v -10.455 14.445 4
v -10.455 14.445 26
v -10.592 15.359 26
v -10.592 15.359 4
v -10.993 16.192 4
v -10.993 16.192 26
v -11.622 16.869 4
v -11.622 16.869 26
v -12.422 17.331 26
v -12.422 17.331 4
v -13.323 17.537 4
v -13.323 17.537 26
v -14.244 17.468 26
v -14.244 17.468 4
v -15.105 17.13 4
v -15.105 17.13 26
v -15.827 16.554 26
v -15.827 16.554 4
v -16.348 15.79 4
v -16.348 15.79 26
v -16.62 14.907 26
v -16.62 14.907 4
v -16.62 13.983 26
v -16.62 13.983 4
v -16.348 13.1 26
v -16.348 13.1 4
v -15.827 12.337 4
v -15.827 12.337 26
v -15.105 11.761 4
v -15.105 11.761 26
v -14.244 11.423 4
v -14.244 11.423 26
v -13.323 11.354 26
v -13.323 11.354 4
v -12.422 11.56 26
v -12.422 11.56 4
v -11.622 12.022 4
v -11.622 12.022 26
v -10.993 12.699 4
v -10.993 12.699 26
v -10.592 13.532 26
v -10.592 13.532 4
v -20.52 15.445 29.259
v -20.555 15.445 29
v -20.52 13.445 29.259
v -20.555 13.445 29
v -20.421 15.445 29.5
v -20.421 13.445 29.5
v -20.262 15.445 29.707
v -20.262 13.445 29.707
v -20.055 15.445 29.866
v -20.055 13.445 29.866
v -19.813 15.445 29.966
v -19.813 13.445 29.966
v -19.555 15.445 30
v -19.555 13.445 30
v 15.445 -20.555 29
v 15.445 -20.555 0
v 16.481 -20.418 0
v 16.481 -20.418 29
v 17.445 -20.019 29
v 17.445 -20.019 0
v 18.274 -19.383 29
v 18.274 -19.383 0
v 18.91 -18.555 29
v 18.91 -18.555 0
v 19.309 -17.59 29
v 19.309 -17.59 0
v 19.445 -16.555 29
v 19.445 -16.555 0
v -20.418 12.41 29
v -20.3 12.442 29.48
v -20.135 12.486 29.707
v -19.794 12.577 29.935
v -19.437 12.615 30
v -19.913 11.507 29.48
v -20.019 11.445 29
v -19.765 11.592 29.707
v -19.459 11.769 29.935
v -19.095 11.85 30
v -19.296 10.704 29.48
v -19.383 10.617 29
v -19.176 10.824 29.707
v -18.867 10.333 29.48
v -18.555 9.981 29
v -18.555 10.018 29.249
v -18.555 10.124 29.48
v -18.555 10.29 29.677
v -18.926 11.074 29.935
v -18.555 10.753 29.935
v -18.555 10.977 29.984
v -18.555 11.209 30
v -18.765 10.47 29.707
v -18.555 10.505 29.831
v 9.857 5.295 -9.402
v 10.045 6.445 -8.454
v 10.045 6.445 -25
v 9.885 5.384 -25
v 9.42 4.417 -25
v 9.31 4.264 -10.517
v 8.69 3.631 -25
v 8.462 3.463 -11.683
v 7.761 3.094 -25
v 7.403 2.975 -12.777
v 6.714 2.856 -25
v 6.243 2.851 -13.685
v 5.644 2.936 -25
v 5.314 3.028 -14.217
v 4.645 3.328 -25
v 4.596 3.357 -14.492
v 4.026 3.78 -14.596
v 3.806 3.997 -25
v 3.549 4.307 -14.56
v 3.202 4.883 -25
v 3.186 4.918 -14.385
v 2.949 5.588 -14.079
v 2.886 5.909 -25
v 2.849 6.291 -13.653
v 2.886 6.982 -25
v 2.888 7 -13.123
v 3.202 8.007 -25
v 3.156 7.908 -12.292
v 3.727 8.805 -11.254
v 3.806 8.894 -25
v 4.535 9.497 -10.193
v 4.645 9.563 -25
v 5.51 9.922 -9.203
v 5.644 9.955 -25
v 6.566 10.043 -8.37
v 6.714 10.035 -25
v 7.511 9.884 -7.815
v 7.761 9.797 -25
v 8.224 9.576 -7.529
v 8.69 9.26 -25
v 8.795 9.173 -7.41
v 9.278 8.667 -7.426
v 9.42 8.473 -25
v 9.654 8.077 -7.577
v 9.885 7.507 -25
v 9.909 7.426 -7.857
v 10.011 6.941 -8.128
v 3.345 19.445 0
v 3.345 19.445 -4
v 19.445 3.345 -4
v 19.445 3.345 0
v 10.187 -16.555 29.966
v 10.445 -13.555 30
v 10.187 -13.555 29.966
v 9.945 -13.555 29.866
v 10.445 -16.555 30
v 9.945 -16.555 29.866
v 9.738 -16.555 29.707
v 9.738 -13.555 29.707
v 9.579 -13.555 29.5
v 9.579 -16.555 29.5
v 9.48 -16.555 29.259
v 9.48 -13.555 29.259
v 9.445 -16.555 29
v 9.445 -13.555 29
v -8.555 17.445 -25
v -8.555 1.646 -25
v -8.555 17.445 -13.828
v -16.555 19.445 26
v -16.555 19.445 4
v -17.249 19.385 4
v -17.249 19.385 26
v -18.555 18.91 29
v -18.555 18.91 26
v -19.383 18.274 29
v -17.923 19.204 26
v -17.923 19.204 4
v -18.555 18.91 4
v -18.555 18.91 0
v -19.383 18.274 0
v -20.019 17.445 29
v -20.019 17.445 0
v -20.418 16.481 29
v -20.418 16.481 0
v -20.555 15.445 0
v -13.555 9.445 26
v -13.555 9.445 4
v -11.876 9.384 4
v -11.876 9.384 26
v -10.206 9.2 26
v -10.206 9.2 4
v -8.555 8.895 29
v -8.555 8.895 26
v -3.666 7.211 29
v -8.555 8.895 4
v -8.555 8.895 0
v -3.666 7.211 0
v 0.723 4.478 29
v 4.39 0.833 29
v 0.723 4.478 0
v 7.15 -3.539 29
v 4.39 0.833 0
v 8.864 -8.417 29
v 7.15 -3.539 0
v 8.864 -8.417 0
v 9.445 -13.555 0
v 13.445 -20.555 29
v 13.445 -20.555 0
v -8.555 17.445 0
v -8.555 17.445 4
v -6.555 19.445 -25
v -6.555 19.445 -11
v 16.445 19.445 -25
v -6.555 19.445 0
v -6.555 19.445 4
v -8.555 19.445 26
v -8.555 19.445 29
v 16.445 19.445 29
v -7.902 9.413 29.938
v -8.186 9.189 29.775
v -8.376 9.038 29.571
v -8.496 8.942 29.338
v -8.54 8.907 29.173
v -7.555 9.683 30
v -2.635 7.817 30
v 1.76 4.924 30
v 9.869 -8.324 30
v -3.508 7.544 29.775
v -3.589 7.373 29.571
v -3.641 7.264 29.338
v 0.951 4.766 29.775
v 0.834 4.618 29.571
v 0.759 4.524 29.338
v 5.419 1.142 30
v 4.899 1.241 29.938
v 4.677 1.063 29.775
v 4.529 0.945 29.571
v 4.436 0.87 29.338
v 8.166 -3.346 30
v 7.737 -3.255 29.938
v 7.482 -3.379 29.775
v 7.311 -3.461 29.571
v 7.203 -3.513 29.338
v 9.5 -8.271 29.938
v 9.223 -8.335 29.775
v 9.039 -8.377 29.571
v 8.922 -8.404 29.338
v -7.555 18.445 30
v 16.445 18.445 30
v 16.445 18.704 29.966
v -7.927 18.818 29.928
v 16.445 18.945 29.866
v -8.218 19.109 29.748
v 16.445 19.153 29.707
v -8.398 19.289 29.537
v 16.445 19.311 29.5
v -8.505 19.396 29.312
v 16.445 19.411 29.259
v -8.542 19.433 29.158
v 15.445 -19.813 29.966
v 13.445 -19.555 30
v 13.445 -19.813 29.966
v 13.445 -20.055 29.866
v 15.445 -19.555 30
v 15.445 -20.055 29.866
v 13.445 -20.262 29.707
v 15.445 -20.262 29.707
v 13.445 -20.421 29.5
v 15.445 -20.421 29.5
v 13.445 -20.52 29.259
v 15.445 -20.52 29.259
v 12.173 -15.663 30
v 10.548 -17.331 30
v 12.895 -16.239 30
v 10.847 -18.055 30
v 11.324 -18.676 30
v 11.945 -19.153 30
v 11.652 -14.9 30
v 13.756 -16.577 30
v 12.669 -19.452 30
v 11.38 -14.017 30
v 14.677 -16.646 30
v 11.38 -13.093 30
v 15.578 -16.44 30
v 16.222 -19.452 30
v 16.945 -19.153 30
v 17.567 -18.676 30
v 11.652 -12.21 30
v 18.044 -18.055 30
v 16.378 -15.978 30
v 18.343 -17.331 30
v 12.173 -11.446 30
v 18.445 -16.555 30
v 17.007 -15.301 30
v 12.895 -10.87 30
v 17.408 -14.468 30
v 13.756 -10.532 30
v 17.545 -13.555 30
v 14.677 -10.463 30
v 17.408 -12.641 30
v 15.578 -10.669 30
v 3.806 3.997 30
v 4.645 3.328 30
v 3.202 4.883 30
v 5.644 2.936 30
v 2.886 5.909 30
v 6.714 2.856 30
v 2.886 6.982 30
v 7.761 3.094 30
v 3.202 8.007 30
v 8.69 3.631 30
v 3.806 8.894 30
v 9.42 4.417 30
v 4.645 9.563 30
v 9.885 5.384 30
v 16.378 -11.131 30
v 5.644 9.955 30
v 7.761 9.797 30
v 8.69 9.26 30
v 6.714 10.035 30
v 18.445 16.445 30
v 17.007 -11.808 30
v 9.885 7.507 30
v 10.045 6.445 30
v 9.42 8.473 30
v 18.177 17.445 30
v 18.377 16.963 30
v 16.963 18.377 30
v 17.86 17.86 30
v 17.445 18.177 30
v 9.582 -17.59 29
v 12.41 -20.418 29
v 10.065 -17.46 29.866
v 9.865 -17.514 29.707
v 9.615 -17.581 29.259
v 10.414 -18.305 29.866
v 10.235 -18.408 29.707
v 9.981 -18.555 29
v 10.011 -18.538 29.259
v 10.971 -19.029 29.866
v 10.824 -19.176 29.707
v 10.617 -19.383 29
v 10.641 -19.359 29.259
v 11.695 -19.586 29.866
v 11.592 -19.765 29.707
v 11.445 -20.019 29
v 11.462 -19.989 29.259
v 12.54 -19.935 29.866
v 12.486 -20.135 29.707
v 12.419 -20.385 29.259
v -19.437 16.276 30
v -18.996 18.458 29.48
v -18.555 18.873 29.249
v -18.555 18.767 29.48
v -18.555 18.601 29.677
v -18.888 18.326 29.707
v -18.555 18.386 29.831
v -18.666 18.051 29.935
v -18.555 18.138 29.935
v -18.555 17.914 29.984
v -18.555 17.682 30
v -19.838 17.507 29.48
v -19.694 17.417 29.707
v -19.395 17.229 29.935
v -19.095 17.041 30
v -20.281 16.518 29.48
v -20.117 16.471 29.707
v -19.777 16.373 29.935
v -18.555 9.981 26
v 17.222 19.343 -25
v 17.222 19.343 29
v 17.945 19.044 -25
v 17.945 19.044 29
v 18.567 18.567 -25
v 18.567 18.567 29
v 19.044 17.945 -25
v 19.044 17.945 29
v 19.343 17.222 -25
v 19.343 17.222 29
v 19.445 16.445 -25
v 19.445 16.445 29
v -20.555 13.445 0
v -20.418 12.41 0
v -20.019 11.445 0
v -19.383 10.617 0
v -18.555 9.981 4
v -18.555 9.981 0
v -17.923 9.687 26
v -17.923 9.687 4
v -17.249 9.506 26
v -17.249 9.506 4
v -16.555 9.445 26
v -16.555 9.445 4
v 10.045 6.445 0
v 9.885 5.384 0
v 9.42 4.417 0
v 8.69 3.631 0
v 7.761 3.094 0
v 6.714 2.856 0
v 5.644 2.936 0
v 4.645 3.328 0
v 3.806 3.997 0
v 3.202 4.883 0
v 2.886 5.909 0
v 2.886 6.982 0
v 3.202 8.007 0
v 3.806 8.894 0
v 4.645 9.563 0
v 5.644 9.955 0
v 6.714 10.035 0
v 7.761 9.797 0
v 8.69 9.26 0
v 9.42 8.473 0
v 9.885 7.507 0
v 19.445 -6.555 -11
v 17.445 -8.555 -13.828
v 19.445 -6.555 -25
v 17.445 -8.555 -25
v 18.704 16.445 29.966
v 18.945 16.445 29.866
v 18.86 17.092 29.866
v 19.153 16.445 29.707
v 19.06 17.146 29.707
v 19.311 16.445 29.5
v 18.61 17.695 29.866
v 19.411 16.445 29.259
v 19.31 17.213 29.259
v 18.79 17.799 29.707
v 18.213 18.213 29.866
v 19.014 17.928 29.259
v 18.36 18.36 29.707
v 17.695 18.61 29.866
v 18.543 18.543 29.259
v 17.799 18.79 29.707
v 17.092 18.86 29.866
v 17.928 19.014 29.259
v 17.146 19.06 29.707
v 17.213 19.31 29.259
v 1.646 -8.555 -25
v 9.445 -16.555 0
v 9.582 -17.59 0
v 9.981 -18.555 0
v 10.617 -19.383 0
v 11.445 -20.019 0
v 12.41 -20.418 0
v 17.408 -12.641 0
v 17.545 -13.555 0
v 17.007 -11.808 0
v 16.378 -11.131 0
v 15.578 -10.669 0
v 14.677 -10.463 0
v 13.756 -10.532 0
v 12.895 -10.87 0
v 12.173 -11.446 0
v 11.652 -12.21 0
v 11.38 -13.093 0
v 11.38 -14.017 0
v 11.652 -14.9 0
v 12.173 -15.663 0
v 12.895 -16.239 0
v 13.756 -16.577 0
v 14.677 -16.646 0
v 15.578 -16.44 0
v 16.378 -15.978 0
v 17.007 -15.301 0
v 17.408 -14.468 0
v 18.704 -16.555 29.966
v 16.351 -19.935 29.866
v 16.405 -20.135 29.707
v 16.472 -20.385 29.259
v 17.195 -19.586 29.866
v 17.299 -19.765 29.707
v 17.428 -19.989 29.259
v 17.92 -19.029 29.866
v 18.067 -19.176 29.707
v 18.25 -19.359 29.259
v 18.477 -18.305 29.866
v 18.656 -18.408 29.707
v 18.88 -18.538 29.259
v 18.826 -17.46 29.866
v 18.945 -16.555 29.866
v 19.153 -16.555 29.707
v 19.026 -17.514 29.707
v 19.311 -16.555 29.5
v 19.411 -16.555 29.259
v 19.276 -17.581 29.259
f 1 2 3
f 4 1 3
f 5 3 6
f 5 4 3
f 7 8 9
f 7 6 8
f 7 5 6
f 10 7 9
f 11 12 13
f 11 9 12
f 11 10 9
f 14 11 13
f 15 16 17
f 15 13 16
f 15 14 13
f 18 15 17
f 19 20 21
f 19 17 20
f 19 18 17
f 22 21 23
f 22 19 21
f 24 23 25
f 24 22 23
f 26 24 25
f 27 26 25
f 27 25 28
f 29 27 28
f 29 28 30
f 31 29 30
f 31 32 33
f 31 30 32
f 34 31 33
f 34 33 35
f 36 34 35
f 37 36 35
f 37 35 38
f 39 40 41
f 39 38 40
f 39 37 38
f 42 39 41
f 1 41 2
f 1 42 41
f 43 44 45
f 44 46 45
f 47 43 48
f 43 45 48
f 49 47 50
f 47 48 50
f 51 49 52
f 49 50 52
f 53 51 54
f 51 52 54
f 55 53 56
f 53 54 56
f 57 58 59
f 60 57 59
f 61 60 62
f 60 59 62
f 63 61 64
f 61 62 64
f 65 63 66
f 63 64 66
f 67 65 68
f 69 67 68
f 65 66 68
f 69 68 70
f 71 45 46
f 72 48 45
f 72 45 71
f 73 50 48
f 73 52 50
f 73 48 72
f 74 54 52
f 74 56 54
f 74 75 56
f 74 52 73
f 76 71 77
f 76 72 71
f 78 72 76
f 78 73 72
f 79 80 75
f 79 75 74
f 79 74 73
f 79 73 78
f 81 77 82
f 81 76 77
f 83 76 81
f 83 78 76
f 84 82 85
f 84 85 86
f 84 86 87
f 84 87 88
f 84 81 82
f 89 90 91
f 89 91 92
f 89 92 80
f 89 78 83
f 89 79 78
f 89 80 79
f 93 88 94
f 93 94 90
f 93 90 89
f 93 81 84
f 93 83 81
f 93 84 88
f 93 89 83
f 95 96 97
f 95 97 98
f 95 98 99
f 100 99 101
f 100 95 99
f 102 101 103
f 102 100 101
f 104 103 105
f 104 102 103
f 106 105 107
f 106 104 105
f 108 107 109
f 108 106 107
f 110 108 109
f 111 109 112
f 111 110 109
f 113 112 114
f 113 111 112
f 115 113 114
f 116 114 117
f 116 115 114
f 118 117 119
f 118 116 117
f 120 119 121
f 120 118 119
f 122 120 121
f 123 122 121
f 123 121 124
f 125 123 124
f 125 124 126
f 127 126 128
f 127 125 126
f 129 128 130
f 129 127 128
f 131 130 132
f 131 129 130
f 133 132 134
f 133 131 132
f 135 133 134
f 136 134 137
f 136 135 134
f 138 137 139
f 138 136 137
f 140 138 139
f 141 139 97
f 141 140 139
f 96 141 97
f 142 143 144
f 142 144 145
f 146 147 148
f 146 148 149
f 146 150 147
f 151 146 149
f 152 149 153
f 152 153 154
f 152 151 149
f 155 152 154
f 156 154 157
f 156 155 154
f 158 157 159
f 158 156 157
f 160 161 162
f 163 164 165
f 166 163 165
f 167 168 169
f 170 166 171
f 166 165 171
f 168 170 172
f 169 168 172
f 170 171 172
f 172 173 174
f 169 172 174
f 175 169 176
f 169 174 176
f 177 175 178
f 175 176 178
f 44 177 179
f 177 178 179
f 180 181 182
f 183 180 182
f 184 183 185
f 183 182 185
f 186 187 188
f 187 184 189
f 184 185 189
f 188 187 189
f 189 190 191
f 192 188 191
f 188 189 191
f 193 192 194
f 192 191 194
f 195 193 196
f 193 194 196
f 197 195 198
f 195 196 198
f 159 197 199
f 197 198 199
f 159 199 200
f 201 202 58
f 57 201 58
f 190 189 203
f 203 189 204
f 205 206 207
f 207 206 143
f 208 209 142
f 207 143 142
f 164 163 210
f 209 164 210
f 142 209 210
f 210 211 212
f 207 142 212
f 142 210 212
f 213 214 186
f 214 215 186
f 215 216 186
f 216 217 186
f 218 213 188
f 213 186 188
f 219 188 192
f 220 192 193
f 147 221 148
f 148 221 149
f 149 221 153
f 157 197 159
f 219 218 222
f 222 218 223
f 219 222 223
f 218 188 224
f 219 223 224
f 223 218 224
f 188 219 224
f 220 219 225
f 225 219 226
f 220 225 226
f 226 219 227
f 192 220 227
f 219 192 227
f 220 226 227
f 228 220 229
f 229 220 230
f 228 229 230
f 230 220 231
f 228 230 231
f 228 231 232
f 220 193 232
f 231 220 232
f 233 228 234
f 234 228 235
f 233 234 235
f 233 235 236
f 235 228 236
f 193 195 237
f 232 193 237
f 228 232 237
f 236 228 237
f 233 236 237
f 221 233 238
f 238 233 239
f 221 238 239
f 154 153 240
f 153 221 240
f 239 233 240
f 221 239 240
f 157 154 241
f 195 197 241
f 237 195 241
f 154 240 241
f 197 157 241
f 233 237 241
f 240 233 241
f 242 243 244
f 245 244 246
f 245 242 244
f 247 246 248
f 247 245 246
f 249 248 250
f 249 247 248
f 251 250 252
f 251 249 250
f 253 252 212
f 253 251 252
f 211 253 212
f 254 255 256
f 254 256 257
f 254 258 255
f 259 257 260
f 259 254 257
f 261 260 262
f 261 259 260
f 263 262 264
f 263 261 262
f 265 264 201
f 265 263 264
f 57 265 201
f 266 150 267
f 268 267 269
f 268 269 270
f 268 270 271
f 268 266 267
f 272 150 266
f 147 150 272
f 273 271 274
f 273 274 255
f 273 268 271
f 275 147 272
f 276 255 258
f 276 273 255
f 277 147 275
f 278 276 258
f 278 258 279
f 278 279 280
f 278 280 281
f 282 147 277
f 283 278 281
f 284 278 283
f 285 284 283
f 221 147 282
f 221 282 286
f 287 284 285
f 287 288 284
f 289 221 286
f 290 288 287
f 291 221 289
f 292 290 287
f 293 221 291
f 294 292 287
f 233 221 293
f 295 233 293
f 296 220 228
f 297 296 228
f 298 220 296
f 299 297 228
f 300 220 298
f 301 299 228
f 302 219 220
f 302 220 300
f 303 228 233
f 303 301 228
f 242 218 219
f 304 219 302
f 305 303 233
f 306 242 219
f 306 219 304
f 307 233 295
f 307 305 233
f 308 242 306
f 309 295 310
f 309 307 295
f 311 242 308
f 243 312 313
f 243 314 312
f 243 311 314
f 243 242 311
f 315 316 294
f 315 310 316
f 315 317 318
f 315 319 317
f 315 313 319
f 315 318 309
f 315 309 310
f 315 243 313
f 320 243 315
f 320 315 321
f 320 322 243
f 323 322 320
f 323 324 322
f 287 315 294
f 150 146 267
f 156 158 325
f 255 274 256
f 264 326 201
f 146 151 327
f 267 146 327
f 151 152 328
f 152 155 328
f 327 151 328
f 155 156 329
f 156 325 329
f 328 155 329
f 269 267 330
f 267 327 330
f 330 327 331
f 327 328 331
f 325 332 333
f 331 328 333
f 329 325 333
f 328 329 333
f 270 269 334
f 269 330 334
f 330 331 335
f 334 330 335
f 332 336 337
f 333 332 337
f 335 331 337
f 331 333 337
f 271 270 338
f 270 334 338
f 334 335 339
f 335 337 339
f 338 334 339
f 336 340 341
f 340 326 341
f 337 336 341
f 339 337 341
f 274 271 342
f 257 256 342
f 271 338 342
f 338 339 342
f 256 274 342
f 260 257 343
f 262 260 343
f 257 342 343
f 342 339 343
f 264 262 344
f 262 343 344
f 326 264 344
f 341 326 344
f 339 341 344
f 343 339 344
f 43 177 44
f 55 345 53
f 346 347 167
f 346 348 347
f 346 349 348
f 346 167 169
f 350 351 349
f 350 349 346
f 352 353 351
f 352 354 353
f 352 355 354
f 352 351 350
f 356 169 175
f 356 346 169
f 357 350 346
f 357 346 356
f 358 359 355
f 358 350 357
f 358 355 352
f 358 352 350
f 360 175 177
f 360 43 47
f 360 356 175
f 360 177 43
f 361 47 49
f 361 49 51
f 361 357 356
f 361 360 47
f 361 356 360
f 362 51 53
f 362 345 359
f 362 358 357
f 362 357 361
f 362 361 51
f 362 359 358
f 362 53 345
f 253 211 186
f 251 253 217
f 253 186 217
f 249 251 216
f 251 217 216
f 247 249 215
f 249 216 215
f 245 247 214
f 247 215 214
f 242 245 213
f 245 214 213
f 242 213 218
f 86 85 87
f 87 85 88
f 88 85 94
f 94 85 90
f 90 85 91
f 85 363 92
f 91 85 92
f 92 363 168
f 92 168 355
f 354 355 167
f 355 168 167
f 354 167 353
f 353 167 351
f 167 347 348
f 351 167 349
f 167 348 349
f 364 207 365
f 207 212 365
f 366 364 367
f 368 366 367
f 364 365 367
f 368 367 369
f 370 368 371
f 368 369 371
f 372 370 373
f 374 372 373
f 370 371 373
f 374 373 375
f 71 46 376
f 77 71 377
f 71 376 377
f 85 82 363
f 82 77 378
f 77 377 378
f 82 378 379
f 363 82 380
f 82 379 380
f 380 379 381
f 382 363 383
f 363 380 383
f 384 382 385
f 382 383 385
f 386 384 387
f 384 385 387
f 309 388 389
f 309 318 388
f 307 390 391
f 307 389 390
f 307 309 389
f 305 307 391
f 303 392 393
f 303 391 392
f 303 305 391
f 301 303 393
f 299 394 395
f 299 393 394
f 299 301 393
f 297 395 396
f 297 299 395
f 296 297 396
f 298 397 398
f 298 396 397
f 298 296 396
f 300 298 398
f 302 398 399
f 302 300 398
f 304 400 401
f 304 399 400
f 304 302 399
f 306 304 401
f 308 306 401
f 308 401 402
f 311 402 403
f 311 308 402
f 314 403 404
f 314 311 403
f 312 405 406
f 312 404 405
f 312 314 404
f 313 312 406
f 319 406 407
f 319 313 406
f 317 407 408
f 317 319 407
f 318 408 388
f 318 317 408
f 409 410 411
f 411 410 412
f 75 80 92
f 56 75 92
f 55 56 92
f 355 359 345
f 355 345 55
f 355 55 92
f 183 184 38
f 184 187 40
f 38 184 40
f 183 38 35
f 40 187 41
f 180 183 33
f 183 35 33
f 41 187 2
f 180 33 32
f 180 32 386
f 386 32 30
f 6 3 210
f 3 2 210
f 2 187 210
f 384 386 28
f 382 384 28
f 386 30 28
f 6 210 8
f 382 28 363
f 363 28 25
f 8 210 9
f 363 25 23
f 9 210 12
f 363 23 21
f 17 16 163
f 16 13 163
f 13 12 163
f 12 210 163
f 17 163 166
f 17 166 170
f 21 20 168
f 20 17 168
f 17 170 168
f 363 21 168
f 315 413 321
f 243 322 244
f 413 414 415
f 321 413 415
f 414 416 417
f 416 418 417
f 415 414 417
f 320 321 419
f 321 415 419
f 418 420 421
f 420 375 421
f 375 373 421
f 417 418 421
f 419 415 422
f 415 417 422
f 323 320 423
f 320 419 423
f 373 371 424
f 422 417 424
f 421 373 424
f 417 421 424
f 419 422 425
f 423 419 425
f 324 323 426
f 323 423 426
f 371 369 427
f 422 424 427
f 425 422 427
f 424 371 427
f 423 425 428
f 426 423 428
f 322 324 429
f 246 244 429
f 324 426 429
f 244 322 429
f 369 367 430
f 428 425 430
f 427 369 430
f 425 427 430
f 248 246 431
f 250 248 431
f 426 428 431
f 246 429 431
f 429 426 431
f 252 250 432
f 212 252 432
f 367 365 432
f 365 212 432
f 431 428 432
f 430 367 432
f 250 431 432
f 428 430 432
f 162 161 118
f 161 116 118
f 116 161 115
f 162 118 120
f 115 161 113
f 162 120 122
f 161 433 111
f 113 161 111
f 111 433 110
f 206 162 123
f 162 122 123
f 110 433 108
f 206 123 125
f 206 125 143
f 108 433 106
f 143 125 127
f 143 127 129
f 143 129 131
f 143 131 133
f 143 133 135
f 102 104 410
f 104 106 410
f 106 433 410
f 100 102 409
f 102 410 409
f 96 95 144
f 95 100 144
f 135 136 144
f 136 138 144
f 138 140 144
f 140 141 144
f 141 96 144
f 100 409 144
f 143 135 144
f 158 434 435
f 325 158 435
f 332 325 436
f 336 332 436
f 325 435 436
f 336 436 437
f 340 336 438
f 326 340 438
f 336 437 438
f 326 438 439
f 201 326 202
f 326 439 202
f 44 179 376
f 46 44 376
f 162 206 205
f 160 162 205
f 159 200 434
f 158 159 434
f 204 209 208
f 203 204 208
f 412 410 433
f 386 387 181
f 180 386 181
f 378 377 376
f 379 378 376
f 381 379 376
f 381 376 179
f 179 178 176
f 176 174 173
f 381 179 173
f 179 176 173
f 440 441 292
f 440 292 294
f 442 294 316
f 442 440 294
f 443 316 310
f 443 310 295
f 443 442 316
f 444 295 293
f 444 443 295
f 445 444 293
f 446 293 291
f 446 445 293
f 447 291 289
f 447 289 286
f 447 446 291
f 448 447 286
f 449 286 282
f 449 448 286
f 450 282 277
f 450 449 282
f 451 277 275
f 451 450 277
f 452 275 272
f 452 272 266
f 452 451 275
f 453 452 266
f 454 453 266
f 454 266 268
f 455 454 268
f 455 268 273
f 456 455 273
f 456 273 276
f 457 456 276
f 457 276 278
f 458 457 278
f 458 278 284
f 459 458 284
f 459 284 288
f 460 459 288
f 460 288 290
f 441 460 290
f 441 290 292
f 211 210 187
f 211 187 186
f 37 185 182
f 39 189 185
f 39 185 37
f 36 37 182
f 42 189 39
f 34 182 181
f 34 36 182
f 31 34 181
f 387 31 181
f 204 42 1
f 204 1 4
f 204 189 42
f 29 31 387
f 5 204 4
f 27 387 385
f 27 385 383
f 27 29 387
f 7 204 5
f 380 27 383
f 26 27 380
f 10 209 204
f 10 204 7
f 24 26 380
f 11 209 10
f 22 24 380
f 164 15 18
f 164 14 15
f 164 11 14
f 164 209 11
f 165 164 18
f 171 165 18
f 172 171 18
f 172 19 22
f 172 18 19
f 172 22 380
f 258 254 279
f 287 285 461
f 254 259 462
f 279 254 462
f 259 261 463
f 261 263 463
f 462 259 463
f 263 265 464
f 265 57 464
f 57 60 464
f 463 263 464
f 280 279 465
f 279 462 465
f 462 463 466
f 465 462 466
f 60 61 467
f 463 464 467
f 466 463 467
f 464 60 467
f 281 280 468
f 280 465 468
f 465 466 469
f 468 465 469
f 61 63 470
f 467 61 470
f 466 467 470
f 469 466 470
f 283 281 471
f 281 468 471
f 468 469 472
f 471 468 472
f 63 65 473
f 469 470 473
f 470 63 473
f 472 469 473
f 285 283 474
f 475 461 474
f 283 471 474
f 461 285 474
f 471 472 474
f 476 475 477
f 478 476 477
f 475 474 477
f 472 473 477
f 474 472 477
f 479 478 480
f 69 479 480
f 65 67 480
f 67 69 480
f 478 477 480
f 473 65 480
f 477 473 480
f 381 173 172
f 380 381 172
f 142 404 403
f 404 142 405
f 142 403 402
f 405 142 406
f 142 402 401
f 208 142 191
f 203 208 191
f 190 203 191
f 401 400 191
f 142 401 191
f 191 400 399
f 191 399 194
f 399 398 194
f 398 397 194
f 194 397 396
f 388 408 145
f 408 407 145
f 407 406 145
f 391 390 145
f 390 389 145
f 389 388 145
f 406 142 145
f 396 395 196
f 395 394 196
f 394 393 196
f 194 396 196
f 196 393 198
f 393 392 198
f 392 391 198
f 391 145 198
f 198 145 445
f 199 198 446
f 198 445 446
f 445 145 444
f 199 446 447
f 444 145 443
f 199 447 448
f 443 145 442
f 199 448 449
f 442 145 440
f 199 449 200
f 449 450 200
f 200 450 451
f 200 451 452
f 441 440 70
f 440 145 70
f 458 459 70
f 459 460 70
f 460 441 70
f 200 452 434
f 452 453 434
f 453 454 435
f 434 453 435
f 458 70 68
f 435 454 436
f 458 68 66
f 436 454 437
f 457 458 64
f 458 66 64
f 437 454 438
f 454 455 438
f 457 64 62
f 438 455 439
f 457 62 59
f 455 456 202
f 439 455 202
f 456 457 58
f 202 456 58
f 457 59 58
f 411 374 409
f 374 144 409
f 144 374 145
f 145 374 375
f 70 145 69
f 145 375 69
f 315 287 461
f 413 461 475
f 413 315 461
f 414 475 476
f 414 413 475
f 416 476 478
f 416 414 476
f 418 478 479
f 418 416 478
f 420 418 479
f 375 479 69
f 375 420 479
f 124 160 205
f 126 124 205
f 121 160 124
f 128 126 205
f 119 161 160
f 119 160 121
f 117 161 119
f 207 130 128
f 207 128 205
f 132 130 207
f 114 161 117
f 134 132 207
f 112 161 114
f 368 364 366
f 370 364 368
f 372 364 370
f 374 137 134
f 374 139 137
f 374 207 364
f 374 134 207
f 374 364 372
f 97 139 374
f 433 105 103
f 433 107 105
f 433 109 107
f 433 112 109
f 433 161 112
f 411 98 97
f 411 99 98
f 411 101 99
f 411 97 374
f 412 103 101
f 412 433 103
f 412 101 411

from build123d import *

# Parameters (mm, degrees)
F0_R     = 3.1
F0_R_2   = 3.6
F1_DEPTH = 30
F2_W     = 10
F2_H     = 4
F3_DEPTH = 40.001
F4_R     = 1
F5_R     = 3.6
F6_DEPTH = 25
F7_SIZE  = 2
F9_DEPTH = 46.6700476997


with BuildPart() as f1:
    # F0 (on Top) → F1 (new body)
    with BuildSketch(Plane.XY):
        with BuildLine():
            Line((16.4454364826, 19.4454364826), (-16.5545635174, 19.4454364826))
            ThreePointArc((-16.5545635174, 19.4454364826), (-19.3829906421, 18.2738636074), (-20.5545635174, 15.4454364826))
            Line((-20.5545635174, 15.4454364826), (-20.5545635174, 13.4454364826))
            ThreePointArc((-20.5545635174, 13.4454364826), (-19.3829906421, 10.6170093579), (-16.5545635174, 9.4454364826))
            Line((-16.5545635174, 9.4454364826), (-13.5545635174, 9.4454364826))
            ThreePointArc((-13.5545635174, 9.4454364826), (2.7088924499, 2.7088924499), (9.4454364826, -13.5545635174))
            Line((9.4454364826, -13.5545635174), (9.4454364826, -16.5545635174))
            ThreePointArc((9.4454364826, -16.5545635174), (10.6170093579, -19.3829906421), (13.4454364826, -20.5545635174))
            Line((13.4454364826, -20.5545635174), (15.4454364826, -20.5545635174))
            ThreePointArc((15.4454364826, -20.5545635174), (18.2738636074, -19.3829906421), (19.4454364826, -16.5545635174))
            Line((19.4454364826, -16.5545635174), (19.4454364826, 16.4454364826))
            ThreePointArc((19.4454364826, 16.4454364826), (18.5667568262, 18.5667568262), (16.4454364826, 19.4454364826))
        make_face()
        with Locations((14.4454364826, -13.5545635174)):
            Circle(F0_R, mode=Mode.SUBTRACT)
        with Locations((-13.5545635174, 14.4454364826)):
            Circle(F0_R, mode=Mode.SUBTRACT)
        with Locations((6.4454364826, 6.4454364826)):
            Circle(F0_R_2, mode=Mode.SUBTRACT)
    extrude(amount=F1_DEPTH)

    # F2 (on face) → F3 (cut, through all)
    with BuildSketch(Plane(origin=(0, 19.4454364826, 0), x_dir=(-1, 0, 0), z_dir=(0, 1, 0))):
        with Locations((13.5545635174, 28)):
            Rectangle(F2_W, F2_H)
        with Locations((13.5545635174, 2)):
            Rectangle(F2_W, F2_H)
    extrude(amount=-F3_DEPTH, mode=Mode.SUBTRACT)

    # F4
    f4_edges = [f1.edges().sort_by_distance(p)[0] for p in [
        (4.389795, 0.832931, 30),
        (-20.554564, 14.445436, 30),
        (-8.554564, 14.170409, 30),
    ]]
    fillet(f4_edges, radius=F4_R)

    # F5 (on face) → F6 (join)
    with BuildSketch(Plane(origin=(0, 0, 0), x_dir=(1, 0, 0), z_dir=(0, 0, -1))):
        with BuildLine():
            Line((-8.5545635174, 8.5545635174), (-8.5545635174, -19.4454364826))
            Line((-8.5545635174, -19.4454364826), (16.4454364826, -19.4454364826))
            ThreePointArc((16.4454364826, -19.4454364826), (18.5667568262, -18.5667568262), (19.4454364826, -16.4454364826))
            Line((19.4454364826, -16.4454364826), (19.4454364826, 8.5545635174))
            Line((19.4454364826, 8.5545635174), (-8.5545635174, 8.5545635174))
        make_face()
        with Locations((6.4454364826, -6.4454364826)):
            Circle(F5_R, mode=Mode.SUBTRACT)
    extrude(amount=F6_DEPTH)

    # F7
    f7_edges = [f1.edges().sort_by_distance(p)[0] for p in [
        (19.445436, -8.554564, -12.5),
        (-8.554564, 19.445436, -10.5),
    ]]
    chamfer(f7_edges, length=F7_SIZE)

    # F8 (on face) → F9 (cut, through all)
    with BuildSketch(Plane(origin=(13, -13, 0), x_dir=(0.7071067812, 0.7071067812, 0), z_dir=(0.7071067812, -0.7071067812, 0))):
        Polygon((16.1152236891, -4), (16.1152236891, 0), (-28.8847763109, 0), (-28.8847763109, -49), align=None)
    extrude(amount=-F9_DEPTH, mode=Mode.SUBTRACT)


solid = f1.part
